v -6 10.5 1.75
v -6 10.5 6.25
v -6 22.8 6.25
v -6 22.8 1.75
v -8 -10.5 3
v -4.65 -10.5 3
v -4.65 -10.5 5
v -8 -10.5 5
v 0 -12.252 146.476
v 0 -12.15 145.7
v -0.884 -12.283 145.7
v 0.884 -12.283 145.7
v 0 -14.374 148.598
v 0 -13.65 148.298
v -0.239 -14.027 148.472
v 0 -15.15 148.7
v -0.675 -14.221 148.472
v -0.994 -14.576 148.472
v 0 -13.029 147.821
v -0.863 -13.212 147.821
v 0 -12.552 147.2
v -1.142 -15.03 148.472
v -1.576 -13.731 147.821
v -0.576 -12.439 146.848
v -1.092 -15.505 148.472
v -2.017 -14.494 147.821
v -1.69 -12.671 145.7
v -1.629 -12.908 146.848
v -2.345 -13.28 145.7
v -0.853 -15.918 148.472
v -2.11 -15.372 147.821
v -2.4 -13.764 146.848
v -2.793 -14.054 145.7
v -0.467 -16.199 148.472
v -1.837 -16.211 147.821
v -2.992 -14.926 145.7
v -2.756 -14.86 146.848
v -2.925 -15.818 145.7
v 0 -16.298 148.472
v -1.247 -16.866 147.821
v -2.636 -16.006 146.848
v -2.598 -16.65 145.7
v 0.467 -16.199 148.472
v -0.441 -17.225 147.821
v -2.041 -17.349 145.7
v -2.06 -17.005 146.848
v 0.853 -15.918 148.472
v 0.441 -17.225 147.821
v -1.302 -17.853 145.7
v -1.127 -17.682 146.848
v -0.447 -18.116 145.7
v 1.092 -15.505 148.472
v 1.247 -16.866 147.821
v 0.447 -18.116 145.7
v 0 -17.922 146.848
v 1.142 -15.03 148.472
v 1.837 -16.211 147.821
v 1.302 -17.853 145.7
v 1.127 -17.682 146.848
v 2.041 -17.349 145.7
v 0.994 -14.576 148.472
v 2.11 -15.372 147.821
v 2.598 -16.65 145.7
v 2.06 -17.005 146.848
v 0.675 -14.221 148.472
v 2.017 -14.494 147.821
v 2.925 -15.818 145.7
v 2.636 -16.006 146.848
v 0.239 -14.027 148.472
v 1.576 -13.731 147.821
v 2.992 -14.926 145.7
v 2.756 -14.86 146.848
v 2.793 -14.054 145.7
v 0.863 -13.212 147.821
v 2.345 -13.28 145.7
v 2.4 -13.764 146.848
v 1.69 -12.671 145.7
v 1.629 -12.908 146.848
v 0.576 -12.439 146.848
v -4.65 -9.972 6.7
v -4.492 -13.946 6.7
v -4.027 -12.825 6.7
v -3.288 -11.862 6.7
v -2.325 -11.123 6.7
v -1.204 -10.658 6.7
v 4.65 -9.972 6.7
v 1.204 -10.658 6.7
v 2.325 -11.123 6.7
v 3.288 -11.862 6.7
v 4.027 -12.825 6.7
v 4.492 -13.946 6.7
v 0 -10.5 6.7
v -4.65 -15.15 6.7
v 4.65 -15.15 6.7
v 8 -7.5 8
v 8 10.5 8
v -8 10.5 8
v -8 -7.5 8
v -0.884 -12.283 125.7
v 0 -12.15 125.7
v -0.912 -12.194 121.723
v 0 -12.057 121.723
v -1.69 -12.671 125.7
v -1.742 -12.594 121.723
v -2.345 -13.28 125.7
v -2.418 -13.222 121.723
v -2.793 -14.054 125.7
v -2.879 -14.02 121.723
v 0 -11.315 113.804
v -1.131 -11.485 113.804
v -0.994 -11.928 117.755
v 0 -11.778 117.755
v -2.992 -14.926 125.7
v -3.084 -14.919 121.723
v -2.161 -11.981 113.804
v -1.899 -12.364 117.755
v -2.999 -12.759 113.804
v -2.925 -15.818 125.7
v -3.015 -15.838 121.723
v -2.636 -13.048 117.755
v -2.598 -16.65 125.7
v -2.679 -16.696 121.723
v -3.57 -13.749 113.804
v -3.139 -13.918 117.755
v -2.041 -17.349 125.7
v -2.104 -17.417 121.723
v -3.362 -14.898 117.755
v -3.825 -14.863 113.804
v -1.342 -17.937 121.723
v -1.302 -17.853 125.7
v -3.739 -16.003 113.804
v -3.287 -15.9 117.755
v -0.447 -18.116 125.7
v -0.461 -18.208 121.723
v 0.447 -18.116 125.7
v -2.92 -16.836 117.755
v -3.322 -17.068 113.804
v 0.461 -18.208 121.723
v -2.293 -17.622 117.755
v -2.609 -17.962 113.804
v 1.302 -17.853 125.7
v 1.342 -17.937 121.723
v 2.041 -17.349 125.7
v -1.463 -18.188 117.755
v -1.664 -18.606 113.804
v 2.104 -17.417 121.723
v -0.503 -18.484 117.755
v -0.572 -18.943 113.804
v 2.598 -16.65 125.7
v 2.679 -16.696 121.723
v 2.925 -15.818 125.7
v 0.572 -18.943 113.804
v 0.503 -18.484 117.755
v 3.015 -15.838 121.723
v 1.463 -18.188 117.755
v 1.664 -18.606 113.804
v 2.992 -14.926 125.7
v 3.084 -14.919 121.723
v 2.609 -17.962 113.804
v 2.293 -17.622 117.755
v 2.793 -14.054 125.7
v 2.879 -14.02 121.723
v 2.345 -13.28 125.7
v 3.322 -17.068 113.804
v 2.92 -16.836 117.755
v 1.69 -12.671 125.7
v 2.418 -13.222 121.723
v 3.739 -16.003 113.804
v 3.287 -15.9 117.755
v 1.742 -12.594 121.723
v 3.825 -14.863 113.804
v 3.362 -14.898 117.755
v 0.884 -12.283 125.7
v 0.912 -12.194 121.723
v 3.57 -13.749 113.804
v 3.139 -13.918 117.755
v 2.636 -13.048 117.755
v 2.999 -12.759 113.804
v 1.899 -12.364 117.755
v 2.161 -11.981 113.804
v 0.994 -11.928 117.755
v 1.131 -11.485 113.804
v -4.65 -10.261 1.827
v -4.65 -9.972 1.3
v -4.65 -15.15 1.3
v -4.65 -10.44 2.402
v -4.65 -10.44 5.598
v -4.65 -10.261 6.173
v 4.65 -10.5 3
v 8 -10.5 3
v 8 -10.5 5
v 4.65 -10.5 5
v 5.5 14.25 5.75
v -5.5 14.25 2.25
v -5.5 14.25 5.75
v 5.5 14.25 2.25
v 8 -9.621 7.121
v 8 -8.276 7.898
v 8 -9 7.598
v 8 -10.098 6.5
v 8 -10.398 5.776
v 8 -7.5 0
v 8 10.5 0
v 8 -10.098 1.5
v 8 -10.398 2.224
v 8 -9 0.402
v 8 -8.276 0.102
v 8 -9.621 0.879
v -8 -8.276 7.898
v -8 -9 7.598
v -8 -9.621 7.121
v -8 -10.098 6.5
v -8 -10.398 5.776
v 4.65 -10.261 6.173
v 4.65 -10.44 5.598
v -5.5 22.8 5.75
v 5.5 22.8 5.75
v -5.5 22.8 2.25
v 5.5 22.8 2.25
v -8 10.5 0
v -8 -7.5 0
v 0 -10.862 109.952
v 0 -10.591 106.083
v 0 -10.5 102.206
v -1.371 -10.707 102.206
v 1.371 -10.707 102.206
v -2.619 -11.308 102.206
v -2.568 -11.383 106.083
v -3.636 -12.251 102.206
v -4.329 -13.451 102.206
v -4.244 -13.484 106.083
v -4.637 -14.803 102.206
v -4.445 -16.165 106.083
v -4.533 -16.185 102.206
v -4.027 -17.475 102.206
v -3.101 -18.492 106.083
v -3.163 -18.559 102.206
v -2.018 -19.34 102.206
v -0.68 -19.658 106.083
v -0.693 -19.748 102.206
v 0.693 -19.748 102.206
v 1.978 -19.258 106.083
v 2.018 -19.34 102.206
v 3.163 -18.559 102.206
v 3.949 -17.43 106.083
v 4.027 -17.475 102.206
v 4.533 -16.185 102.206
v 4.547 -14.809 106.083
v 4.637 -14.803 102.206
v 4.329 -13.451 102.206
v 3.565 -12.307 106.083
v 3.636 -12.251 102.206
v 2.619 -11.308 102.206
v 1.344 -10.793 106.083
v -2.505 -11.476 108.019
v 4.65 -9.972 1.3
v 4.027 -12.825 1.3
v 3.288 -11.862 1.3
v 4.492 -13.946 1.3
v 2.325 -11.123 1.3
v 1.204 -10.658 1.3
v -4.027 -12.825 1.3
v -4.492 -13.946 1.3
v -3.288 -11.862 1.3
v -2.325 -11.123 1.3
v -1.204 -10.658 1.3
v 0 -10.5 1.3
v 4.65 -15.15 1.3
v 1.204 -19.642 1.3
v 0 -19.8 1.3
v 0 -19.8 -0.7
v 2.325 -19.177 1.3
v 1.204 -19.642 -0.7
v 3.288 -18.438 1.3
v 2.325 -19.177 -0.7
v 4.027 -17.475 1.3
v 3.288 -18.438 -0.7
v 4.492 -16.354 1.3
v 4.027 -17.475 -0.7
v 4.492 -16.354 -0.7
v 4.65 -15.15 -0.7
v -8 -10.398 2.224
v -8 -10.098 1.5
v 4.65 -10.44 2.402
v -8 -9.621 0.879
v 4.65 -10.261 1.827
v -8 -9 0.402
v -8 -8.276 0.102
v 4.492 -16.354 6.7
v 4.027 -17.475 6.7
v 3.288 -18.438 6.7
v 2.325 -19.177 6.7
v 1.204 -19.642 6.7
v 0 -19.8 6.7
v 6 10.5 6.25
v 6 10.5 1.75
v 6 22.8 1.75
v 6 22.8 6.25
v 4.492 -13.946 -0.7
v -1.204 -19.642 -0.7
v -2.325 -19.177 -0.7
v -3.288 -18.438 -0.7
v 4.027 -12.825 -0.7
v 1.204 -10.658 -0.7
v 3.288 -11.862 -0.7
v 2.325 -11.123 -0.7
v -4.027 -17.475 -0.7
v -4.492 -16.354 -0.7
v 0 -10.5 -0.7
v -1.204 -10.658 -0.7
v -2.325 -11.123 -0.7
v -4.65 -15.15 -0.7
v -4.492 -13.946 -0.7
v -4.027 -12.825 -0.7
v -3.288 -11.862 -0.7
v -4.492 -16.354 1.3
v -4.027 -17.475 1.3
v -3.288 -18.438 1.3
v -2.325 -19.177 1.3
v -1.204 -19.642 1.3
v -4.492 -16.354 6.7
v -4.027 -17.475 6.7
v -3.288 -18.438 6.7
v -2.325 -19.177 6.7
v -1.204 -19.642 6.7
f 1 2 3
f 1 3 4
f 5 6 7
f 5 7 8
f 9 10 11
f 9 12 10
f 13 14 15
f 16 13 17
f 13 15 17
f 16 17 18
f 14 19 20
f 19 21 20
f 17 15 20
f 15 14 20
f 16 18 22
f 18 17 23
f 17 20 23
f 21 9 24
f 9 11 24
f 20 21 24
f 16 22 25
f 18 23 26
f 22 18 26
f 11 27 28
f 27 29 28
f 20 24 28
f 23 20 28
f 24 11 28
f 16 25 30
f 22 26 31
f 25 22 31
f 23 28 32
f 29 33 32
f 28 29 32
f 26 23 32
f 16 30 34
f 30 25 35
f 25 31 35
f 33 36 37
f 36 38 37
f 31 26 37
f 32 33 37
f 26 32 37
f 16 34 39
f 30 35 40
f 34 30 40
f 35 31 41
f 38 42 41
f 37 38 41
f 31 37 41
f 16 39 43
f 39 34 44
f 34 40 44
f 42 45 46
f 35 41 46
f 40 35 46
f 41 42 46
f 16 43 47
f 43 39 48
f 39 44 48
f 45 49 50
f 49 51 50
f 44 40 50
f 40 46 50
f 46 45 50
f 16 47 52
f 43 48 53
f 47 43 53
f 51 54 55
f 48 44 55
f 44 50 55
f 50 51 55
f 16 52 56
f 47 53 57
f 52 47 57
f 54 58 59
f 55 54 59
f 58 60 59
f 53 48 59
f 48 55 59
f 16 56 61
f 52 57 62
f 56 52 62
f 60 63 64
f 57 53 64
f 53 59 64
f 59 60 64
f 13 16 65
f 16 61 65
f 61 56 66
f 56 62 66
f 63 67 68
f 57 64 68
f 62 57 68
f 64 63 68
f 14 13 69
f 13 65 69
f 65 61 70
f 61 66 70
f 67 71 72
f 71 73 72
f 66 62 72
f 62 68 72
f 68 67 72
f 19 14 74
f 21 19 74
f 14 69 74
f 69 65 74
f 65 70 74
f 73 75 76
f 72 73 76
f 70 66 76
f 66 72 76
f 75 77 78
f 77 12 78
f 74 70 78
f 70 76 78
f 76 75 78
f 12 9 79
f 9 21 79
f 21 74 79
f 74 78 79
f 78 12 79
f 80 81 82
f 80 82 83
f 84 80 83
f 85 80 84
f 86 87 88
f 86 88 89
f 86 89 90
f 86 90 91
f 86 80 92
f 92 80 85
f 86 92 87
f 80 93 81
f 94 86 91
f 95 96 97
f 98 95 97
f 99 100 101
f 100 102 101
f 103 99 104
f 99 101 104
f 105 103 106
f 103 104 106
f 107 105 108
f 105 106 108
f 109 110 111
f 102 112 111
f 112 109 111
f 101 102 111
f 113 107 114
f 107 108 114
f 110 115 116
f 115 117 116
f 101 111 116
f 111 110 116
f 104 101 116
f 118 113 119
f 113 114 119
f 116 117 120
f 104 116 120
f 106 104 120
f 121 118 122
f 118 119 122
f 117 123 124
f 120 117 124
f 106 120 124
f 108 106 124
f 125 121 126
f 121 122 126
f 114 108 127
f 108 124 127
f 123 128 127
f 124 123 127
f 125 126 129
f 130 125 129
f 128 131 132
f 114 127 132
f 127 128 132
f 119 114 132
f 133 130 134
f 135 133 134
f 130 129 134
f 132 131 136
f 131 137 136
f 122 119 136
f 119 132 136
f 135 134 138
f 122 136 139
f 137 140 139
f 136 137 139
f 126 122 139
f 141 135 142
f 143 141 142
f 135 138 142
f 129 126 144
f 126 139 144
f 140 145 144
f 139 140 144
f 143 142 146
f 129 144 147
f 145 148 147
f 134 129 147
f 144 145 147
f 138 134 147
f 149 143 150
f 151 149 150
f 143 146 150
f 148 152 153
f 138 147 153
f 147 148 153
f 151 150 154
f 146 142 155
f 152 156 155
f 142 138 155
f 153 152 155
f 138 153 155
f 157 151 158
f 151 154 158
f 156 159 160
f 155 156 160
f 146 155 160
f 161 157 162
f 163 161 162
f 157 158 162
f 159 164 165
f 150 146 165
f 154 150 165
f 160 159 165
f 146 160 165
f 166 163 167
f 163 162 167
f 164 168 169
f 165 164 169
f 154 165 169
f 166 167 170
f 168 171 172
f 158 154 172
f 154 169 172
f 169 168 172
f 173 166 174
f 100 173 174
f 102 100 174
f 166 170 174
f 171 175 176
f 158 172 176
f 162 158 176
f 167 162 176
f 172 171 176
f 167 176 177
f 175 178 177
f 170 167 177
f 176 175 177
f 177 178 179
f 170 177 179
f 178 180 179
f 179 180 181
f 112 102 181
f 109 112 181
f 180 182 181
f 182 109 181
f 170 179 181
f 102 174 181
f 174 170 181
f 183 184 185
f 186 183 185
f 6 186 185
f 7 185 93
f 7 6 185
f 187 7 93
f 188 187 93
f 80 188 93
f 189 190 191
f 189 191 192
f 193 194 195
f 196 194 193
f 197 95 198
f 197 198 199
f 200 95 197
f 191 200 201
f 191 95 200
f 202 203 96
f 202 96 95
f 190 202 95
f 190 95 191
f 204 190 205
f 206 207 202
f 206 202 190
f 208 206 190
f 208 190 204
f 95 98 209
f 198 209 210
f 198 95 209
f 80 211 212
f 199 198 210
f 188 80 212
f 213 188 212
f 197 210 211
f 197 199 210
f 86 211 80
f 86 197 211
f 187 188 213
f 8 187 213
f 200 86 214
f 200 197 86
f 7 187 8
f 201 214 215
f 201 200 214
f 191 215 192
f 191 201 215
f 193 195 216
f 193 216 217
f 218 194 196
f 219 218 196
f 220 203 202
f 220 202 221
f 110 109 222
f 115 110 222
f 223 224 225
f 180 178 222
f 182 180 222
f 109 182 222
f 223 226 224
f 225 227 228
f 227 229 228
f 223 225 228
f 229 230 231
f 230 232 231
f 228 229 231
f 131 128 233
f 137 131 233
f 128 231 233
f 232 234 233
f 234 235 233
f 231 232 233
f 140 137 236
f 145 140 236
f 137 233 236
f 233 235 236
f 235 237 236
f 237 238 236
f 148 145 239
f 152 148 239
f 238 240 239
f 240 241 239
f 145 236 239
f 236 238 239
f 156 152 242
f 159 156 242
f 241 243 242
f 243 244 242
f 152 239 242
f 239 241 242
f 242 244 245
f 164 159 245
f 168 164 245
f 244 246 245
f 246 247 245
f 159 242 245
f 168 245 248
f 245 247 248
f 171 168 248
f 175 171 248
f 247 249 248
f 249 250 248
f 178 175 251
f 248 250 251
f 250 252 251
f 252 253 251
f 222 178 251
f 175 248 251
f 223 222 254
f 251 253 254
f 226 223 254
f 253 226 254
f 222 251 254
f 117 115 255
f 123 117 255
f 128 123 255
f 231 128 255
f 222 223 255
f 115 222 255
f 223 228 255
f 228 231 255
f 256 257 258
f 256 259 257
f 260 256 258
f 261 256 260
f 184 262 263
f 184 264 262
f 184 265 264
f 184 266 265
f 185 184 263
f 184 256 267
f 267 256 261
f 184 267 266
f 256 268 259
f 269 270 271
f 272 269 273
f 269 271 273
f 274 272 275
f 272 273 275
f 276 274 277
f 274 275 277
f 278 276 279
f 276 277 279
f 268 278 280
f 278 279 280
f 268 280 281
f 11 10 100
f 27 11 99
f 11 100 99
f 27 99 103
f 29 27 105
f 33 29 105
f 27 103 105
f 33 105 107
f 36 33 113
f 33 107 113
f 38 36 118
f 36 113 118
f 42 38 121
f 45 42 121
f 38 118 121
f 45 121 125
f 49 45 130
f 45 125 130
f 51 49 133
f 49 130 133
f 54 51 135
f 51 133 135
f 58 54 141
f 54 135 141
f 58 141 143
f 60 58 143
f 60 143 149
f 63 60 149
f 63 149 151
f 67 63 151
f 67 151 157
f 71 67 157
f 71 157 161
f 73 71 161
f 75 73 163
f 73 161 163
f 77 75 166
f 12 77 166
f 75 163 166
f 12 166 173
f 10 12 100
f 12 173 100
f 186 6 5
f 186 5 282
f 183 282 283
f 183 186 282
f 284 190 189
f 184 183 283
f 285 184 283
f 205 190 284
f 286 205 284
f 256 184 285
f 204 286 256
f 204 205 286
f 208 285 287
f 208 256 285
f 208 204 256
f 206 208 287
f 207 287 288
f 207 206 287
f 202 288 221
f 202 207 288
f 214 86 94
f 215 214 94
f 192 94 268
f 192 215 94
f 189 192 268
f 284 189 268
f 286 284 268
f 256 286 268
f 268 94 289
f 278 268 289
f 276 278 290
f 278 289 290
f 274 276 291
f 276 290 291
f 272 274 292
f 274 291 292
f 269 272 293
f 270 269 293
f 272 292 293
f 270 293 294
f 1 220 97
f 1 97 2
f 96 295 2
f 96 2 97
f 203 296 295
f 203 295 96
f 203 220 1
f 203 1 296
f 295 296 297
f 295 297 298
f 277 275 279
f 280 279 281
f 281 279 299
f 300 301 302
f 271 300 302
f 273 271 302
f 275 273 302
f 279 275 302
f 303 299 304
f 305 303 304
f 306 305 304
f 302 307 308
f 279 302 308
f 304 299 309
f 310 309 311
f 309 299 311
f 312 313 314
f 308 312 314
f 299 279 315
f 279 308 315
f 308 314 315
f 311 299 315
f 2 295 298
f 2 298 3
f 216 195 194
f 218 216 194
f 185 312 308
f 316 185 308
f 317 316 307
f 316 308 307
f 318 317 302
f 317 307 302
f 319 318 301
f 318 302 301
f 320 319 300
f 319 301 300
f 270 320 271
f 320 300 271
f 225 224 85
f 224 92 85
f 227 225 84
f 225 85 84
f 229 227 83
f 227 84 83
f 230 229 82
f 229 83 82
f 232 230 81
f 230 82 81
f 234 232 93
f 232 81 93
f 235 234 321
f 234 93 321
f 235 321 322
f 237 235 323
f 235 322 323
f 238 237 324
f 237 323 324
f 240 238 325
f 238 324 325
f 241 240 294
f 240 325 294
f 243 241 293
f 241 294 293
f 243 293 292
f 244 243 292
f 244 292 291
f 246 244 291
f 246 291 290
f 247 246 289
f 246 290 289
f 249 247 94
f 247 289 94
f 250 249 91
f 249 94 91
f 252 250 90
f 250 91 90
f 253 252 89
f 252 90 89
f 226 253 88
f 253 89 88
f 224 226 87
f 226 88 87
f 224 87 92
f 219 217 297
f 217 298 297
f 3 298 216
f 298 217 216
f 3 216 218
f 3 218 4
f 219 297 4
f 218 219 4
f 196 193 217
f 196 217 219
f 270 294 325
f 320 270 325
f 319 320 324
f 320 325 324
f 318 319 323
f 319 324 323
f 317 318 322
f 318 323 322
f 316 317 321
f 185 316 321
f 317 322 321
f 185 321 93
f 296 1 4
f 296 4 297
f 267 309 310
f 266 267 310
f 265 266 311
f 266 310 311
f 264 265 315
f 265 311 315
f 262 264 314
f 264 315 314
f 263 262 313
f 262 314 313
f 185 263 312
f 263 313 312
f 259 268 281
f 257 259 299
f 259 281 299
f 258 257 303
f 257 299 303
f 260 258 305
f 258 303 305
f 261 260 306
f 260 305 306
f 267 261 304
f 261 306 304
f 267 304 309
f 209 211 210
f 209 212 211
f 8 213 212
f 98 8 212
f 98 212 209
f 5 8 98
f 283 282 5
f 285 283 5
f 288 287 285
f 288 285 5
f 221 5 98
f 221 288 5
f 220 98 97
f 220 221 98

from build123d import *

# Parameters (mm, degrees)
RESSALTO_EXTRUS_O1_DEPTH      = 8
RESSALTO_EXTRUS_O2_DEPTH      = 12.3
CORTE_EXTRUS_O1_DEPTH         = 29.979993098687927
RESSALTO_EXTRUS_O3_DEPTH      = 9.3
RESSALTO_EXTRUS_O3_DEPTH_BACK = 12.3
CORTE_EXTRUS_O2_DEPTH         = 145.04110524430172
CORTE_EXTRUS_O5_START         = 3.75
ESBO_O10_W                    = 11
ESBO_O10_H                    = 3.4999999999999987
CORTE_EXTRUS_O5_DEPTH         = 149.21637788030614


with BuildPart() as part:
    # Esboço1 → Ressalto-extrusão1 (new body)
    with BuildSketch(Plane.XY):
        Polygon((-8, 10.499999999999998), (8, 10.499999999999998), (8.000000000000004, -10.500000000000002), (-8, -10.500000000000002), align=None)
    extrude(amount=RESSALTO_EXTRUS_O1_DEPTH)

    # Esboço2 → Ressalto-extrusão2 (add)
    with BuildSketch(Plane(origin=(0, 10.499999999999998, 0), x_dir=(1, 0, 0), z_dir=(0, 1, 0))):
        Polygon((-6.000000000000002, -1.750000000000001), (5.999999999999998, -1.750000000000001), (5.999999999999998, -6.25), (-6, -6.25), align=None)
    extrude(amount=RESSALTO_EXTRUS_O2_DEPTH)

    # Esboço3 → Corte-extrusão1 (cut, through all)
    with BuildSketch(Plane(origin=(8.000000000000002, 1.32e-15, 0), x_dir=(0, 0, -1), z_dir=(1, 1.7e-16, 0))):
        with BuildLine():
            Line((12.302112688752674, -8.041249801298202), (15.759799941349684, -18.709266127928004))
            Line((15.759799941349684, -18.709266127928004), (-12.82894273367674, -20.250050884769166))
            Line((-12.82894273367674, -20.250050884769166), (-17.748760130002903, -20.25005088476917))
            Line((-17.748760130002903, -20.25005088476917), (-21.504856301930886, -7.075521773543869))
            Line((-21.504856301930886, -7.075521773543869), (-8, -7.499999999999983))
            ThreePointArc((-8, -7.499999999999983), (-7.121320343559643, -9.621320343559647), (-4.999999999999979, -10.500000000000004))
            Line((-4.999999999999979, -10.500000000000004), (-3.0000000000000213, -10.500000000000004))
            ThreePointArc((-3.0000000000000213, -10.500000000000004), (-0.8786796564403576, -9.621320343559647), (0, -7.499999999999983))
            Line((0, -7.499999999999983), (12.302112688752674, -8.041249801298202))
        make_face()
    extrude(amount=-CORTE_EXTRUS_O1_DEPTH, mode=Mode.SUBTRACT)

    # Esboço4 → Ressalto-extrusão3 (add, two sides: drawn at the far end of the back side and taken through both)
    with BuildSketch(Plane.XZ.offset(10.500000000000002).offset(-RESSALTO_EXTRUS_O3_DEPTH_BACK)):
        Polygon((-4.6499999999999995, 6.700000000000003), (4.650000000000001, 6.700000000000004), (4.650000000000001, 1.3000000000000025), (-4.649999999999998, 1.3000000000000025), align=None)
    extrude(amount=RESSALTO_EXTRUS_O3_DEPTH + RESSALTO_EXTRUS_O3_DEPTH_BACK)

    # Esboço8 → Revolução1 (revolve)
    with BuildSketch(Plane(origin=(0, 0, 0), x_dir=(0, 0, -1), z_dir=(1, 0, 0)), mode=Mode.PRIVATE) as revolu_o1_sk:
        with BuildLine():
            Line((0.6999999999999975, -15.150000000000004), (-1.3000000000000025, -15.150000000000002))
            Line((-1.3000000000000025, -15.150000000000002), (-6.700000000000003, -15.150000000000004))
            Line((-6.700000000000003, -15.150000000000004), (-125.70000000000003, -15.150000000000018))
            Line((-125.70000000000003, -15.150000000000018), (-125.7, -18.150000000000013))
            ThreePointArc((-125.7, -18.150000000000006), (-119.7371767478927, -18.359131245703352), (-113.80365649100945, -18.985497252888337))
            ThreePointArc((-113.80365649100945, -18.985497252888337), (-108.01923466009754, -19.596123836980453), (-102.20624616421328, -19.80000000000001))
            Line((-102.20624616421328, -19.800000000000015), (-6.700000000000003, -19.800000000000004))
            Line((-6.700000000000003, -19.800000000000004), (0.6999999999999981, -19.800000000000004))
            Line((0.6999999999999981, -19.800000000000004), (0.6999999999999975, -15.150000000000004))
        make_face()
        with BuildLine():
            Line((-125.7, -18.150000000000013), (-125.70000000000003, -15.150000000000018))
            Line((-125.70000000000003, -15.150000000000018), (-148.7, -15.15000000000002))
            ThreePointArc((-148.7, -15.15000000000002), (-147.82132034355962, -17.271320343559655), (-145.7, -18.15000000000001))
            Line((-145.7, -18.150000000000013), (-125.7, -18.150000000000013))
        make_face()
    revolve(revolu_o1_sk.sketch.rotate(Axis((0, -15.150000000000004, 6.700000000000003), (0, -1.1e-16, 1)), 180), axis=Axis((0, -15.150000000000004, 6.700000000000003), (0, -1.1e-16, 1)))

    # Esboço9 → Corte-extrusão2 (cut, through all)
    with BuildSketch(Plane.XY.offset(6.700000000000003)):
        with BuildLine():
            ThreePointArc((4.650000000000001, -15.150000000000004), (3.2880465325174466, -18.43804653251745), (6.2e-16, -19.800000000000004))
            Line((6.2e-16, -19.800000000000004), (4.650000000000002, -19.800000000000004))
            Line((4.650000000000002, -19.800000000000004), (4.650000000000002, -15.150000000000004))
        make_face()
        with BuildLine():
            Line((-4.649999999999999, -19.800000000000004), (8.9e-16, -19.800000000000004))
            ThreePointArc((4.1e-16, -19.800000000000004), (-3.2880465325174453, -18.43804653251745), (-4.649999999999998, -15.150000000000004))
            Line((-4.649999999999999, -15.150000000000004), (-4.649999999999999, -19.800000000000004))
        make_face()
    extrude(amount=-CORTE_EXTRUS_O2_DEPTH, mode=Mode.SUBTRACT)

    # Esboço10 → Corte-extrusão5 (cut, through all)
    with BuildSketch(Plane(origin=(0, 10.499999999999998, 0), x_dir=(1, 0, 0), z_dir=(0, 1, 0)).offset(CORTE_EXTRUS_O5_START)):
        with Locations((-1.78e-15, -4.000000000000001)):
            Rectangle(ESBO_O10_W, ESBO_O10_H)
    extrude(amount=CORTE_EXTRUS_O5_DEPTH, mode=Mode.SUBTRACT)


solid = part.part
